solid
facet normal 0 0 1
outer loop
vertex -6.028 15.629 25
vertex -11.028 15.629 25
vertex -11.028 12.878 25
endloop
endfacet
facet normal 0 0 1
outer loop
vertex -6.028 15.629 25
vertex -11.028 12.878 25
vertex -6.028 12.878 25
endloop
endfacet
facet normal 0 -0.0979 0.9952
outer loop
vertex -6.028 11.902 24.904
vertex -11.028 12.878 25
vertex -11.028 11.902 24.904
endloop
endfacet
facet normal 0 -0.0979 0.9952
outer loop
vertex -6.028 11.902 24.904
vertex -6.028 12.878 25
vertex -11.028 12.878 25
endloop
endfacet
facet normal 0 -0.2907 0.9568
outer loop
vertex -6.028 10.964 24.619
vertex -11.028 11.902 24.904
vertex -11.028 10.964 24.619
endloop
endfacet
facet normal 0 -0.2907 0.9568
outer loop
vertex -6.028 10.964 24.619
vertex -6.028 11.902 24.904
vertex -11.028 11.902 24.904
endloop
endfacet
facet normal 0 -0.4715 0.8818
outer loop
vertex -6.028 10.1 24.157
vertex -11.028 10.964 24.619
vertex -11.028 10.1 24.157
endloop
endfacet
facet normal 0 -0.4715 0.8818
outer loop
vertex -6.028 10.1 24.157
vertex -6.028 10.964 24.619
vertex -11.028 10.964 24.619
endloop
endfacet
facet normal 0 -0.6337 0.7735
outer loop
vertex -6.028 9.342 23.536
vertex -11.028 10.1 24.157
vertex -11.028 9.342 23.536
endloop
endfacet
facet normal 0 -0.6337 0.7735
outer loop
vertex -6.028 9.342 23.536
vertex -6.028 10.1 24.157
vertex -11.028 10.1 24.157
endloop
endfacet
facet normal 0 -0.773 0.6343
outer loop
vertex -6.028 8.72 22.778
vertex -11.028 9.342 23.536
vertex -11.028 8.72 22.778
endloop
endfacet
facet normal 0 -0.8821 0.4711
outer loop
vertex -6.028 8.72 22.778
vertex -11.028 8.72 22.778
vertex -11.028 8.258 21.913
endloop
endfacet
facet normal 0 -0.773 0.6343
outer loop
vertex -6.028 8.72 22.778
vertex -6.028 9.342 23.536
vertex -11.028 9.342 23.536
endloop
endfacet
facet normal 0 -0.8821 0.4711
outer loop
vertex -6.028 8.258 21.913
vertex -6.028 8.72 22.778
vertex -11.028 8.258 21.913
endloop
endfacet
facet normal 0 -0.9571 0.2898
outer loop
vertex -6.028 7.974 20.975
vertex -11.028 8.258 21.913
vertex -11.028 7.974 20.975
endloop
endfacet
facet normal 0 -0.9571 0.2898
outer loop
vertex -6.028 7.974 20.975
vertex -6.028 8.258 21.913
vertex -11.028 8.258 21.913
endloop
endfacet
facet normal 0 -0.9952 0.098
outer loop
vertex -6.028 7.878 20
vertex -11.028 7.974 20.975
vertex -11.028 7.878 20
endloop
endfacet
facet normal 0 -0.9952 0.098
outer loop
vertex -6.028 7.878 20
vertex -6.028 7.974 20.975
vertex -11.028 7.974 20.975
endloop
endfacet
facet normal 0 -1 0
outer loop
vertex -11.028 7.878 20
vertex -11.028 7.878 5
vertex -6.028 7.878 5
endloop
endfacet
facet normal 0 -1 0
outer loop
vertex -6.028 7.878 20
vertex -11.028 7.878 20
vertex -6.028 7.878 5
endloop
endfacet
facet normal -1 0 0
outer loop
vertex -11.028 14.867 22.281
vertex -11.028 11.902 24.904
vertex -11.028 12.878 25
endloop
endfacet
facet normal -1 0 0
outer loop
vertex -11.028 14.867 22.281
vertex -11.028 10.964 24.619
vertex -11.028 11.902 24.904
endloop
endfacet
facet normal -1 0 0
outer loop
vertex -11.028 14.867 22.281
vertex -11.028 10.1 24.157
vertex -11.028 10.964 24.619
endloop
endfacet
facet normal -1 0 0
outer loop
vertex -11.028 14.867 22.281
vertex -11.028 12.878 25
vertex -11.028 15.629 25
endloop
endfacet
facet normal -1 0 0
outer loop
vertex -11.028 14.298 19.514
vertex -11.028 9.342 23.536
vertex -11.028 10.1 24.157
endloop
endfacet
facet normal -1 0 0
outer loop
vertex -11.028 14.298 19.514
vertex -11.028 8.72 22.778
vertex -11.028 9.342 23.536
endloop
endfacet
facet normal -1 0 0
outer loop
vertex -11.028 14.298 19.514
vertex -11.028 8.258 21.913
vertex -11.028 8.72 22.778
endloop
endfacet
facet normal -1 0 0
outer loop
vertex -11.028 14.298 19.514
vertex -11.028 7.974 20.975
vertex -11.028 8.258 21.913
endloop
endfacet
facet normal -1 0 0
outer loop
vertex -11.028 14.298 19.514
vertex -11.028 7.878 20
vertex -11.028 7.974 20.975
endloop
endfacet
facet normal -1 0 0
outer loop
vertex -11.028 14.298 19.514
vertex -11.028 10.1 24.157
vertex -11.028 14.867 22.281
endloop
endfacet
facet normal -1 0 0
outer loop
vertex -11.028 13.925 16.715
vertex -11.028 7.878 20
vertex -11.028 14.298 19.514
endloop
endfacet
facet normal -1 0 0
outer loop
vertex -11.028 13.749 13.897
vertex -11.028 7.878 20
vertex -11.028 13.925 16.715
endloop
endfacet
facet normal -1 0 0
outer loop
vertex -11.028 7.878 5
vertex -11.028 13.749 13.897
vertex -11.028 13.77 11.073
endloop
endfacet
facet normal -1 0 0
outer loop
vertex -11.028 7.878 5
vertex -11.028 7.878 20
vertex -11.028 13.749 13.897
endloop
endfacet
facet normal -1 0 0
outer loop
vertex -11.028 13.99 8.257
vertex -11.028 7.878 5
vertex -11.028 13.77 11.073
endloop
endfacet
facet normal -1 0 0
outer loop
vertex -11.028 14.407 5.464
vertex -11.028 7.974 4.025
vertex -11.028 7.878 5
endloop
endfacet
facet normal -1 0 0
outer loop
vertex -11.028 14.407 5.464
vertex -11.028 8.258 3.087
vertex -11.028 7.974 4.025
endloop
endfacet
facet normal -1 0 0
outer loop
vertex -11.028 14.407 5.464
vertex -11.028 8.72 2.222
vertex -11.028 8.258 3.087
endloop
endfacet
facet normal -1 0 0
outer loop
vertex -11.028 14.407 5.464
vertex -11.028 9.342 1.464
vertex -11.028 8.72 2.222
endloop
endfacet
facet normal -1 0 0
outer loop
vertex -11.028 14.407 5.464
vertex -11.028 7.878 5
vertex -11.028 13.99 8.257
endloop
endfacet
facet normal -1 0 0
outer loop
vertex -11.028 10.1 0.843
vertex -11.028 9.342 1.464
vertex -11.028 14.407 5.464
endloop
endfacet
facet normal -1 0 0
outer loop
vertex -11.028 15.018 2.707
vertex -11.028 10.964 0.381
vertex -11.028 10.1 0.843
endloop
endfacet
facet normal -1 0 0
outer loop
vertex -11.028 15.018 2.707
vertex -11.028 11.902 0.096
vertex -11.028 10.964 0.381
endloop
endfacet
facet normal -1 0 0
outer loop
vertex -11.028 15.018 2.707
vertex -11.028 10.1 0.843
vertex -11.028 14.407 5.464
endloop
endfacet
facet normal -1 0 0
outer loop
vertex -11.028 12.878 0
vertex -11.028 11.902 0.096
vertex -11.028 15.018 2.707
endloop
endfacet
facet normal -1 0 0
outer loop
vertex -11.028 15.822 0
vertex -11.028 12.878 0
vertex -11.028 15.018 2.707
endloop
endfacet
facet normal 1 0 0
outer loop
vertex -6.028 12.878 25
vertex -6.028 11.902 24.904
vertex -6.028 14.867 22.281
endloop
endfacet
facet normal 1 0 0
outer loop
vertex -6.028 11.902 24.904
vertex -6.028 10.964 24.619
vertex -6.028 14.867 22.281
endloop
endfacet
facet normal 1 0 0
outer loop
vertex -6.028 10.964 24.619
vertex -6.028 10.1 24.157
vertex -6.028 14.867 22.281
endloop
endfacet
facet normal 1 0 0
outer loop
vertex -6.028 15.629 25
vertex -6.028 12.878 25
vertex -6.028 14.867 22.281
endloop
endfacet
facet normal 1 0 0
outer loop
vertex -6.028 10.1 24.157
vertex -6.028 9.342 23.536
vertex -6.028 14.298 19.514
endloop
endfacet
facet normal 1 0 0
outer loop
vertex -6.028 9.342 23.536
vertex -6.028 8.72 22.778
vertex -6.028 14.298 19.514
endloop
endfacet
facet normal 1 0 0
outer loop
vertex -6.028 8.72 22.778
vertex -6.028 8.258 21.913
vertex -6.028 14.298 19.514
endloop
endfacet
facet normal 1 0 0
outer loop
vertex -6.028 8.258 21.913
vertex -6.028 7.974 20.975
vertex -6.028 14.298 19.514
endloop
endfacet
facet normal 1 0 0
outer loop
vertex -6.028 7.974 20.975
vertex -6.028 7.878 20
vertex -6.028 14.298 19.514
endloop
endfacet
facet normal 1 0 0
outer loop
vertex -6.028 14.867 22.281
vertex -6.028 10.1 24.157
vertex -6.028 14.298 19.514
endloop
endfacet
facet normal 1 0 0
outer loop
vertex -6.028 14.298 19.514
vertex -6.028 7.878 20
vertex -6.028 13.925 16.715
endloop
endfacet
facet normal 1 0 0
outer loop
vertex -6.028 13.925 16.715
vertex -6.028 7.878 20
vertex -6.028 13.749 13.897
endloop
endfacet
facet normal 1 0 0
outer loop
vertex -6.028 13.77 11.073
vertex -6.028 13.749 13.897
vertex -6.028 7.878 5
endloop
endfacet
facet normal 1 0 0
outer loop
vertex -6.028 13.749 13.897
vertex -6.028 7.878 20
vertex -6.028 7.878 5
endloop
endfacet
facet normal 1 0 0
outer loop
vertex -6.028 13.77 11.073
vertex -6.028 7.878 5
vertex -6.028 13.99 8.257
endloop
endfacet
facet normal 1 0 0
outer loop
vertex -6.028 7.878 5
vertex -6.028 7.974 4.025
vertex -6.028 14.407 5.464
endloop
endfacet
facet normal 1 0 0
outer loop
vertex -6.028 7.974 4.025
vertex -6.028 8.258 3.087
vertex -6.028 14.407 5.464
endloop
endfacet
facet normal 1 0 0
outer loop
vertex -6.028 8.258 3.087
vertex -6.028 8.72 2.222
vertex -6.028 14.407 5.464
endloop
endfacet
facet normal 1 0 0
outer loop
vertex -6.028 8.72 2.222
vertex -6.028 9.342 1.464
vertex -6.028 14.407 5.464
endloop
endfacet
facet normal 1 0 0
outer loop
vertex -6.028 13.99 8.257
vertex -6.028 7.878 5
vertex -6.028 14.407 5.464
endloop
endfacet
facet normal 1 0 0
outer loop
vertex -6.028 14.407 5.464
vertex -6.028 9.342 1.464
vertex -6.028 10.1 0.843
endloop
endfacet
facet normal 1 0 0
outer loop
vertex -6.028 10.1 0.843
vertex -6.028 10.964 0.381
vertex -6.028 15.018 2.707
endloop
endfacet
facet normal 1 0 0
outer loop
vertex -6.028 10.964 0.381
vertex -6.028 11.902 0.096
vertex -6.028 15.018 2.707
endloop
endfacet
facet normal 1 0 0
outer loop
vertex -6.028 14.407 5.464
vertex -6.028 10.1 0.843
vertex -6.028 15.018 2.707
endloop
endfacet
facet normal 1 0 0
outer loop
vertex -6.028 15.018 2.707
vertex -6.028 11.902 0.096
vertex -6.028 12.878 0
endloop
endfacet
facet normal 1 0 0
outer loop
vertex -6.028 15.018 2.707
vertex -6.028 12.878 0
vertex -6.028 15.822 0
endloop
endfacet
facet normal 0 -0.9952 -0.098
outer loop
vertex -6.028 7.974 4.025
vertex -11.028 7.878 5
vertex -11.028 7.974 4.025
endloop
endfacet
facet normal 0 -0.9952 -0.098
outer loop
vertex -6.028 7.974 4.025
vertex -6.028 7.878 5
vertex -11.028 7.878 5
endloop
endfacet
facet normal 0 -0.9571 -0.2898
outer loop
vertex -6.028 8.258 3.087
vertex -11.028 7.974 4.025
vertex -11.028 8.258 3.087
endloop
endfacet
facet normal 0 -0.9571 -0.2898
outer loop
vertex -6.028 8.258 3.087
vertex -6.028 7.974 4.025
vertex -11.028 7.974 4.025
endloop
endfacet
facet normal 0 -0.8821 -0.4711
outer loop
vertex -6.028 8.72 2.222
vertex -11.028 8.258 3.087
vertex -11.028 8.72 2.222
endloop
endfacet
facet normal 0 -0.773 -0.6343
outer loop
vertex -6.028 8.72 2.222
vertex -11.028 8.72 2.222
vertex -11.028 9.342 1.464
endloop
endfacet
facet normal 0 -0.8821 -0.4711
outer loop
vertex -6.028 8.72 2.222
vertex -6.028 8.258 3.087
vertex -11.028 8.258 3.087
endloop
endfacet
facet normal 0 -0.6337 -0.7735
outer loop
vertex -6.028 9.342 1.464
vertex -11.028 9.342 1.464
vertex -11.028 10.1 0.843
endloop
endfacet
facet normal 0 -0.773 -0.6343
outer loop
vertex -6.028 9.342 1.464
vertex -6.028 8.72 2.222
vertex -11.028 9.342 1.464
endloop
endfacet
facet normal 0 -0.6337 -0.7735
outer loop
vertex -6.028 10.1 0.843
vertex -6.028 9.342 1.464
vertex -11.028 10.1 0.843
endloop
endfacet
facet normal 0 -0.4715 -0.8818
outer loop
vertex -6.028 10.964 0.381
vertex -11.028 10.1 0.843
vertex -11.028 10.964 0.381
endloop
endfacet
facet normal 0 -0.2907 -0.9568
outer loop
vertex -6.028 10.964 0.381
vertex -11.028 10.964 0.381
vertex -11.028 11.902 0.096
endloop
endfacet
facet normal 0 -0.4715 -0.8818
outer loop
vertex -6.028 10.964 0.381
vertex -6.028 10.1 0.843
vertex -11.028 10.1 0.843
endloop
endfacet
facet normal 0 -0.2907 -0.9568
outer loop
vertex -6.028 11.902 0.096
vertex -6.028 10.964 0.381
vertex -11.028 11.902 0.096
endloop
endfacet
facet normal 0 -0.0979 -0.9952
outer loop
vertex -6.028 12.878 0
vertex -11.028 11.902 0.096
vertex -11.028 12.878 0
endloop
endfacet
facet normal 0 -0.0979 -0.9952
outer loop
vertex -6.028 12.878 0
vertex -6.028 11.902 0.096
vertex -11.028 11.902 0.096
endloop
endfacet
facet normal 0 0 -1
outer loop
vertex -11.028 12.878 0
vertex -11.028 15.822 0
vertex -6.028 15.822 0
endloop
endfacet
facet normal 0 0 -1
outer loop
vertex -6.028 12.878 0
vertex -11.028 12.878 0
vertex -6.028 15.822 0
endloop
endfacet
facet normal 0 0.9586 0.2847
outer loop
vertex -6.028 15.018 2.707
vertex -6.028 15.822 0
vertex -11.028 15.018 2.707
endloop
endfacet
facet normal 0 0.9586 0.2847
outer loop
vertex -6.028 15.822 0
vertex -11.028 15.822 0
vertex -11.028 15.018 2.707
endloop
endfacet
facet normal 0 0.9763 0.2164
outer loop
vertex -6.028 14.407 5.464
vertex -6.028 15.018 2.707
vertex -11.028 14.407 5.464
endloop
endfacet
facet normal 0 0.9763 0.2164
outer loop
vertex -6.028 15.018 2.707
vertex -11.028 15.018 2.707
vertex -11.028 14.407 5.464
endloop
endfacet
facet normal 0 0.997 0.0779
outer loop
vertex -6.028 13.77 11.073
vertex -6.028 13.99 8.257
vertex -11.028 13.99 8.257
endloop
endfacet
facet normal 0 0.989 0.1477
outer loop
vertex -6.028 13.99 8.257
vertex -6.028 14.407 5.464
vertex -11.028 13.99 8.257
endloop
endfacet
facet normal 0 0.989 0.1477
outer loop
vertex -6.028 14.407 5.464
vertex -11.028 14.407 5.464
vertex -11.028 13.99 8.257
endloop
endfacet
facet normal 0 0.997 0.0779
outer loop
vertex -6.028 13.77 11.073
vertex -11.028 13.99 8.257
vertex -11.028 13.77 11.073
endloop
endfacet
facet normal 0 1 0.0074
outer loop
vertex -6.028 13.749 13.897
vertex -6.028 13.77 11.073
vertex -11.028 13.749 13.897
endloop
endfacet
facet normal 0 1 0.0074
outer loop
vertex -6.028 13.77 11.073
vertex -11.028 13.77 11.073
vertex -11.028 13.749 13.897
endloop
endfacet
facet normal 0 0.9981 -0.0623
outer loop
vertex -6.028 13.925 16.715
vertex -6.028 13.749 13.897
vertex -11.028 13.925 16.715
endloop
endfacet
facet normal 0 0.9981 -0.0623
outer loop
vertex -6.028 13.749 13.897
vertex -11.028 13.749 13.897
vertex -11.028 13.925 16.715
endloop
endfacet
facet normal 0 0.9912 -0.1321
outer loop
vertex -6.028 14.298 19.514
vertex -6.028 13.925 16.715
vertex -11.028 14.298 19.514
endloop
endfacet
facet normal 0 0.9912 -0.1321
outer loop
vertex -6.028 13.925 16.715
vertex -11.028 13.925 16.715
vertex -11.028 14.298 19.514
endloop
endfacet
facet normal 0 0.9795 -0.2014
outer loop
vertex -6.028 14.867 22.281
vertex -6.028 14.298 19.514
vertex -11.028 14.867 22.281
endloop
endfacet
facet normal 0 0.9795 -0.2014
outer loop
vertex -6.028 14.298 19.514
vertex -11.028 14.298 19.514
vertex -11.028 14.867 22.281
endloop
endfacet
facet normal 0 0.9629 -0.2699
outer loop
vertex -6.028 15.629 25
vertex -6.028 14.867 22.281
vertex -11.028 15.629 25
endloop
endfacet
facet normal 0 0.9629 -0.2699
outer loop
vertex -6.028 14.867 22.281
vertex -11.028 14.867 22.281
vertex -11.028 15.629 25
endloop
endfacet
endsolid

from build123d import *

# Parameters (mm, degrees)
F0_W     = 5
F0_H     = 8
F1_DEPTH = 25
F3_D     = 80.5
F4_R     = 5


with BuildPart() as f1:
    # F0 (on Top) → F1 (new body)
    with BuildSketch(Plane.XY):
        with Locations((-8.527812, 11.877605)):
            Rectangle(F0_W, F0_H)
    extrude(amount=F1_DEPTH)

    # F3 (through all)
    with Locations(Plane.YZ):
        with Locations((53.983625, 12.795336)):
            Hole(F3_D / 2)

    # F4
    f4_edges = [f1.edges().sort_by_distance(p)[0] for p in [
        (-8.527812, 7.877605, 0),
        (-8.527812, 7.877605, 25),
    ]]
    fillet(f4_edges, radius=F4_R)


solid = f1.part
